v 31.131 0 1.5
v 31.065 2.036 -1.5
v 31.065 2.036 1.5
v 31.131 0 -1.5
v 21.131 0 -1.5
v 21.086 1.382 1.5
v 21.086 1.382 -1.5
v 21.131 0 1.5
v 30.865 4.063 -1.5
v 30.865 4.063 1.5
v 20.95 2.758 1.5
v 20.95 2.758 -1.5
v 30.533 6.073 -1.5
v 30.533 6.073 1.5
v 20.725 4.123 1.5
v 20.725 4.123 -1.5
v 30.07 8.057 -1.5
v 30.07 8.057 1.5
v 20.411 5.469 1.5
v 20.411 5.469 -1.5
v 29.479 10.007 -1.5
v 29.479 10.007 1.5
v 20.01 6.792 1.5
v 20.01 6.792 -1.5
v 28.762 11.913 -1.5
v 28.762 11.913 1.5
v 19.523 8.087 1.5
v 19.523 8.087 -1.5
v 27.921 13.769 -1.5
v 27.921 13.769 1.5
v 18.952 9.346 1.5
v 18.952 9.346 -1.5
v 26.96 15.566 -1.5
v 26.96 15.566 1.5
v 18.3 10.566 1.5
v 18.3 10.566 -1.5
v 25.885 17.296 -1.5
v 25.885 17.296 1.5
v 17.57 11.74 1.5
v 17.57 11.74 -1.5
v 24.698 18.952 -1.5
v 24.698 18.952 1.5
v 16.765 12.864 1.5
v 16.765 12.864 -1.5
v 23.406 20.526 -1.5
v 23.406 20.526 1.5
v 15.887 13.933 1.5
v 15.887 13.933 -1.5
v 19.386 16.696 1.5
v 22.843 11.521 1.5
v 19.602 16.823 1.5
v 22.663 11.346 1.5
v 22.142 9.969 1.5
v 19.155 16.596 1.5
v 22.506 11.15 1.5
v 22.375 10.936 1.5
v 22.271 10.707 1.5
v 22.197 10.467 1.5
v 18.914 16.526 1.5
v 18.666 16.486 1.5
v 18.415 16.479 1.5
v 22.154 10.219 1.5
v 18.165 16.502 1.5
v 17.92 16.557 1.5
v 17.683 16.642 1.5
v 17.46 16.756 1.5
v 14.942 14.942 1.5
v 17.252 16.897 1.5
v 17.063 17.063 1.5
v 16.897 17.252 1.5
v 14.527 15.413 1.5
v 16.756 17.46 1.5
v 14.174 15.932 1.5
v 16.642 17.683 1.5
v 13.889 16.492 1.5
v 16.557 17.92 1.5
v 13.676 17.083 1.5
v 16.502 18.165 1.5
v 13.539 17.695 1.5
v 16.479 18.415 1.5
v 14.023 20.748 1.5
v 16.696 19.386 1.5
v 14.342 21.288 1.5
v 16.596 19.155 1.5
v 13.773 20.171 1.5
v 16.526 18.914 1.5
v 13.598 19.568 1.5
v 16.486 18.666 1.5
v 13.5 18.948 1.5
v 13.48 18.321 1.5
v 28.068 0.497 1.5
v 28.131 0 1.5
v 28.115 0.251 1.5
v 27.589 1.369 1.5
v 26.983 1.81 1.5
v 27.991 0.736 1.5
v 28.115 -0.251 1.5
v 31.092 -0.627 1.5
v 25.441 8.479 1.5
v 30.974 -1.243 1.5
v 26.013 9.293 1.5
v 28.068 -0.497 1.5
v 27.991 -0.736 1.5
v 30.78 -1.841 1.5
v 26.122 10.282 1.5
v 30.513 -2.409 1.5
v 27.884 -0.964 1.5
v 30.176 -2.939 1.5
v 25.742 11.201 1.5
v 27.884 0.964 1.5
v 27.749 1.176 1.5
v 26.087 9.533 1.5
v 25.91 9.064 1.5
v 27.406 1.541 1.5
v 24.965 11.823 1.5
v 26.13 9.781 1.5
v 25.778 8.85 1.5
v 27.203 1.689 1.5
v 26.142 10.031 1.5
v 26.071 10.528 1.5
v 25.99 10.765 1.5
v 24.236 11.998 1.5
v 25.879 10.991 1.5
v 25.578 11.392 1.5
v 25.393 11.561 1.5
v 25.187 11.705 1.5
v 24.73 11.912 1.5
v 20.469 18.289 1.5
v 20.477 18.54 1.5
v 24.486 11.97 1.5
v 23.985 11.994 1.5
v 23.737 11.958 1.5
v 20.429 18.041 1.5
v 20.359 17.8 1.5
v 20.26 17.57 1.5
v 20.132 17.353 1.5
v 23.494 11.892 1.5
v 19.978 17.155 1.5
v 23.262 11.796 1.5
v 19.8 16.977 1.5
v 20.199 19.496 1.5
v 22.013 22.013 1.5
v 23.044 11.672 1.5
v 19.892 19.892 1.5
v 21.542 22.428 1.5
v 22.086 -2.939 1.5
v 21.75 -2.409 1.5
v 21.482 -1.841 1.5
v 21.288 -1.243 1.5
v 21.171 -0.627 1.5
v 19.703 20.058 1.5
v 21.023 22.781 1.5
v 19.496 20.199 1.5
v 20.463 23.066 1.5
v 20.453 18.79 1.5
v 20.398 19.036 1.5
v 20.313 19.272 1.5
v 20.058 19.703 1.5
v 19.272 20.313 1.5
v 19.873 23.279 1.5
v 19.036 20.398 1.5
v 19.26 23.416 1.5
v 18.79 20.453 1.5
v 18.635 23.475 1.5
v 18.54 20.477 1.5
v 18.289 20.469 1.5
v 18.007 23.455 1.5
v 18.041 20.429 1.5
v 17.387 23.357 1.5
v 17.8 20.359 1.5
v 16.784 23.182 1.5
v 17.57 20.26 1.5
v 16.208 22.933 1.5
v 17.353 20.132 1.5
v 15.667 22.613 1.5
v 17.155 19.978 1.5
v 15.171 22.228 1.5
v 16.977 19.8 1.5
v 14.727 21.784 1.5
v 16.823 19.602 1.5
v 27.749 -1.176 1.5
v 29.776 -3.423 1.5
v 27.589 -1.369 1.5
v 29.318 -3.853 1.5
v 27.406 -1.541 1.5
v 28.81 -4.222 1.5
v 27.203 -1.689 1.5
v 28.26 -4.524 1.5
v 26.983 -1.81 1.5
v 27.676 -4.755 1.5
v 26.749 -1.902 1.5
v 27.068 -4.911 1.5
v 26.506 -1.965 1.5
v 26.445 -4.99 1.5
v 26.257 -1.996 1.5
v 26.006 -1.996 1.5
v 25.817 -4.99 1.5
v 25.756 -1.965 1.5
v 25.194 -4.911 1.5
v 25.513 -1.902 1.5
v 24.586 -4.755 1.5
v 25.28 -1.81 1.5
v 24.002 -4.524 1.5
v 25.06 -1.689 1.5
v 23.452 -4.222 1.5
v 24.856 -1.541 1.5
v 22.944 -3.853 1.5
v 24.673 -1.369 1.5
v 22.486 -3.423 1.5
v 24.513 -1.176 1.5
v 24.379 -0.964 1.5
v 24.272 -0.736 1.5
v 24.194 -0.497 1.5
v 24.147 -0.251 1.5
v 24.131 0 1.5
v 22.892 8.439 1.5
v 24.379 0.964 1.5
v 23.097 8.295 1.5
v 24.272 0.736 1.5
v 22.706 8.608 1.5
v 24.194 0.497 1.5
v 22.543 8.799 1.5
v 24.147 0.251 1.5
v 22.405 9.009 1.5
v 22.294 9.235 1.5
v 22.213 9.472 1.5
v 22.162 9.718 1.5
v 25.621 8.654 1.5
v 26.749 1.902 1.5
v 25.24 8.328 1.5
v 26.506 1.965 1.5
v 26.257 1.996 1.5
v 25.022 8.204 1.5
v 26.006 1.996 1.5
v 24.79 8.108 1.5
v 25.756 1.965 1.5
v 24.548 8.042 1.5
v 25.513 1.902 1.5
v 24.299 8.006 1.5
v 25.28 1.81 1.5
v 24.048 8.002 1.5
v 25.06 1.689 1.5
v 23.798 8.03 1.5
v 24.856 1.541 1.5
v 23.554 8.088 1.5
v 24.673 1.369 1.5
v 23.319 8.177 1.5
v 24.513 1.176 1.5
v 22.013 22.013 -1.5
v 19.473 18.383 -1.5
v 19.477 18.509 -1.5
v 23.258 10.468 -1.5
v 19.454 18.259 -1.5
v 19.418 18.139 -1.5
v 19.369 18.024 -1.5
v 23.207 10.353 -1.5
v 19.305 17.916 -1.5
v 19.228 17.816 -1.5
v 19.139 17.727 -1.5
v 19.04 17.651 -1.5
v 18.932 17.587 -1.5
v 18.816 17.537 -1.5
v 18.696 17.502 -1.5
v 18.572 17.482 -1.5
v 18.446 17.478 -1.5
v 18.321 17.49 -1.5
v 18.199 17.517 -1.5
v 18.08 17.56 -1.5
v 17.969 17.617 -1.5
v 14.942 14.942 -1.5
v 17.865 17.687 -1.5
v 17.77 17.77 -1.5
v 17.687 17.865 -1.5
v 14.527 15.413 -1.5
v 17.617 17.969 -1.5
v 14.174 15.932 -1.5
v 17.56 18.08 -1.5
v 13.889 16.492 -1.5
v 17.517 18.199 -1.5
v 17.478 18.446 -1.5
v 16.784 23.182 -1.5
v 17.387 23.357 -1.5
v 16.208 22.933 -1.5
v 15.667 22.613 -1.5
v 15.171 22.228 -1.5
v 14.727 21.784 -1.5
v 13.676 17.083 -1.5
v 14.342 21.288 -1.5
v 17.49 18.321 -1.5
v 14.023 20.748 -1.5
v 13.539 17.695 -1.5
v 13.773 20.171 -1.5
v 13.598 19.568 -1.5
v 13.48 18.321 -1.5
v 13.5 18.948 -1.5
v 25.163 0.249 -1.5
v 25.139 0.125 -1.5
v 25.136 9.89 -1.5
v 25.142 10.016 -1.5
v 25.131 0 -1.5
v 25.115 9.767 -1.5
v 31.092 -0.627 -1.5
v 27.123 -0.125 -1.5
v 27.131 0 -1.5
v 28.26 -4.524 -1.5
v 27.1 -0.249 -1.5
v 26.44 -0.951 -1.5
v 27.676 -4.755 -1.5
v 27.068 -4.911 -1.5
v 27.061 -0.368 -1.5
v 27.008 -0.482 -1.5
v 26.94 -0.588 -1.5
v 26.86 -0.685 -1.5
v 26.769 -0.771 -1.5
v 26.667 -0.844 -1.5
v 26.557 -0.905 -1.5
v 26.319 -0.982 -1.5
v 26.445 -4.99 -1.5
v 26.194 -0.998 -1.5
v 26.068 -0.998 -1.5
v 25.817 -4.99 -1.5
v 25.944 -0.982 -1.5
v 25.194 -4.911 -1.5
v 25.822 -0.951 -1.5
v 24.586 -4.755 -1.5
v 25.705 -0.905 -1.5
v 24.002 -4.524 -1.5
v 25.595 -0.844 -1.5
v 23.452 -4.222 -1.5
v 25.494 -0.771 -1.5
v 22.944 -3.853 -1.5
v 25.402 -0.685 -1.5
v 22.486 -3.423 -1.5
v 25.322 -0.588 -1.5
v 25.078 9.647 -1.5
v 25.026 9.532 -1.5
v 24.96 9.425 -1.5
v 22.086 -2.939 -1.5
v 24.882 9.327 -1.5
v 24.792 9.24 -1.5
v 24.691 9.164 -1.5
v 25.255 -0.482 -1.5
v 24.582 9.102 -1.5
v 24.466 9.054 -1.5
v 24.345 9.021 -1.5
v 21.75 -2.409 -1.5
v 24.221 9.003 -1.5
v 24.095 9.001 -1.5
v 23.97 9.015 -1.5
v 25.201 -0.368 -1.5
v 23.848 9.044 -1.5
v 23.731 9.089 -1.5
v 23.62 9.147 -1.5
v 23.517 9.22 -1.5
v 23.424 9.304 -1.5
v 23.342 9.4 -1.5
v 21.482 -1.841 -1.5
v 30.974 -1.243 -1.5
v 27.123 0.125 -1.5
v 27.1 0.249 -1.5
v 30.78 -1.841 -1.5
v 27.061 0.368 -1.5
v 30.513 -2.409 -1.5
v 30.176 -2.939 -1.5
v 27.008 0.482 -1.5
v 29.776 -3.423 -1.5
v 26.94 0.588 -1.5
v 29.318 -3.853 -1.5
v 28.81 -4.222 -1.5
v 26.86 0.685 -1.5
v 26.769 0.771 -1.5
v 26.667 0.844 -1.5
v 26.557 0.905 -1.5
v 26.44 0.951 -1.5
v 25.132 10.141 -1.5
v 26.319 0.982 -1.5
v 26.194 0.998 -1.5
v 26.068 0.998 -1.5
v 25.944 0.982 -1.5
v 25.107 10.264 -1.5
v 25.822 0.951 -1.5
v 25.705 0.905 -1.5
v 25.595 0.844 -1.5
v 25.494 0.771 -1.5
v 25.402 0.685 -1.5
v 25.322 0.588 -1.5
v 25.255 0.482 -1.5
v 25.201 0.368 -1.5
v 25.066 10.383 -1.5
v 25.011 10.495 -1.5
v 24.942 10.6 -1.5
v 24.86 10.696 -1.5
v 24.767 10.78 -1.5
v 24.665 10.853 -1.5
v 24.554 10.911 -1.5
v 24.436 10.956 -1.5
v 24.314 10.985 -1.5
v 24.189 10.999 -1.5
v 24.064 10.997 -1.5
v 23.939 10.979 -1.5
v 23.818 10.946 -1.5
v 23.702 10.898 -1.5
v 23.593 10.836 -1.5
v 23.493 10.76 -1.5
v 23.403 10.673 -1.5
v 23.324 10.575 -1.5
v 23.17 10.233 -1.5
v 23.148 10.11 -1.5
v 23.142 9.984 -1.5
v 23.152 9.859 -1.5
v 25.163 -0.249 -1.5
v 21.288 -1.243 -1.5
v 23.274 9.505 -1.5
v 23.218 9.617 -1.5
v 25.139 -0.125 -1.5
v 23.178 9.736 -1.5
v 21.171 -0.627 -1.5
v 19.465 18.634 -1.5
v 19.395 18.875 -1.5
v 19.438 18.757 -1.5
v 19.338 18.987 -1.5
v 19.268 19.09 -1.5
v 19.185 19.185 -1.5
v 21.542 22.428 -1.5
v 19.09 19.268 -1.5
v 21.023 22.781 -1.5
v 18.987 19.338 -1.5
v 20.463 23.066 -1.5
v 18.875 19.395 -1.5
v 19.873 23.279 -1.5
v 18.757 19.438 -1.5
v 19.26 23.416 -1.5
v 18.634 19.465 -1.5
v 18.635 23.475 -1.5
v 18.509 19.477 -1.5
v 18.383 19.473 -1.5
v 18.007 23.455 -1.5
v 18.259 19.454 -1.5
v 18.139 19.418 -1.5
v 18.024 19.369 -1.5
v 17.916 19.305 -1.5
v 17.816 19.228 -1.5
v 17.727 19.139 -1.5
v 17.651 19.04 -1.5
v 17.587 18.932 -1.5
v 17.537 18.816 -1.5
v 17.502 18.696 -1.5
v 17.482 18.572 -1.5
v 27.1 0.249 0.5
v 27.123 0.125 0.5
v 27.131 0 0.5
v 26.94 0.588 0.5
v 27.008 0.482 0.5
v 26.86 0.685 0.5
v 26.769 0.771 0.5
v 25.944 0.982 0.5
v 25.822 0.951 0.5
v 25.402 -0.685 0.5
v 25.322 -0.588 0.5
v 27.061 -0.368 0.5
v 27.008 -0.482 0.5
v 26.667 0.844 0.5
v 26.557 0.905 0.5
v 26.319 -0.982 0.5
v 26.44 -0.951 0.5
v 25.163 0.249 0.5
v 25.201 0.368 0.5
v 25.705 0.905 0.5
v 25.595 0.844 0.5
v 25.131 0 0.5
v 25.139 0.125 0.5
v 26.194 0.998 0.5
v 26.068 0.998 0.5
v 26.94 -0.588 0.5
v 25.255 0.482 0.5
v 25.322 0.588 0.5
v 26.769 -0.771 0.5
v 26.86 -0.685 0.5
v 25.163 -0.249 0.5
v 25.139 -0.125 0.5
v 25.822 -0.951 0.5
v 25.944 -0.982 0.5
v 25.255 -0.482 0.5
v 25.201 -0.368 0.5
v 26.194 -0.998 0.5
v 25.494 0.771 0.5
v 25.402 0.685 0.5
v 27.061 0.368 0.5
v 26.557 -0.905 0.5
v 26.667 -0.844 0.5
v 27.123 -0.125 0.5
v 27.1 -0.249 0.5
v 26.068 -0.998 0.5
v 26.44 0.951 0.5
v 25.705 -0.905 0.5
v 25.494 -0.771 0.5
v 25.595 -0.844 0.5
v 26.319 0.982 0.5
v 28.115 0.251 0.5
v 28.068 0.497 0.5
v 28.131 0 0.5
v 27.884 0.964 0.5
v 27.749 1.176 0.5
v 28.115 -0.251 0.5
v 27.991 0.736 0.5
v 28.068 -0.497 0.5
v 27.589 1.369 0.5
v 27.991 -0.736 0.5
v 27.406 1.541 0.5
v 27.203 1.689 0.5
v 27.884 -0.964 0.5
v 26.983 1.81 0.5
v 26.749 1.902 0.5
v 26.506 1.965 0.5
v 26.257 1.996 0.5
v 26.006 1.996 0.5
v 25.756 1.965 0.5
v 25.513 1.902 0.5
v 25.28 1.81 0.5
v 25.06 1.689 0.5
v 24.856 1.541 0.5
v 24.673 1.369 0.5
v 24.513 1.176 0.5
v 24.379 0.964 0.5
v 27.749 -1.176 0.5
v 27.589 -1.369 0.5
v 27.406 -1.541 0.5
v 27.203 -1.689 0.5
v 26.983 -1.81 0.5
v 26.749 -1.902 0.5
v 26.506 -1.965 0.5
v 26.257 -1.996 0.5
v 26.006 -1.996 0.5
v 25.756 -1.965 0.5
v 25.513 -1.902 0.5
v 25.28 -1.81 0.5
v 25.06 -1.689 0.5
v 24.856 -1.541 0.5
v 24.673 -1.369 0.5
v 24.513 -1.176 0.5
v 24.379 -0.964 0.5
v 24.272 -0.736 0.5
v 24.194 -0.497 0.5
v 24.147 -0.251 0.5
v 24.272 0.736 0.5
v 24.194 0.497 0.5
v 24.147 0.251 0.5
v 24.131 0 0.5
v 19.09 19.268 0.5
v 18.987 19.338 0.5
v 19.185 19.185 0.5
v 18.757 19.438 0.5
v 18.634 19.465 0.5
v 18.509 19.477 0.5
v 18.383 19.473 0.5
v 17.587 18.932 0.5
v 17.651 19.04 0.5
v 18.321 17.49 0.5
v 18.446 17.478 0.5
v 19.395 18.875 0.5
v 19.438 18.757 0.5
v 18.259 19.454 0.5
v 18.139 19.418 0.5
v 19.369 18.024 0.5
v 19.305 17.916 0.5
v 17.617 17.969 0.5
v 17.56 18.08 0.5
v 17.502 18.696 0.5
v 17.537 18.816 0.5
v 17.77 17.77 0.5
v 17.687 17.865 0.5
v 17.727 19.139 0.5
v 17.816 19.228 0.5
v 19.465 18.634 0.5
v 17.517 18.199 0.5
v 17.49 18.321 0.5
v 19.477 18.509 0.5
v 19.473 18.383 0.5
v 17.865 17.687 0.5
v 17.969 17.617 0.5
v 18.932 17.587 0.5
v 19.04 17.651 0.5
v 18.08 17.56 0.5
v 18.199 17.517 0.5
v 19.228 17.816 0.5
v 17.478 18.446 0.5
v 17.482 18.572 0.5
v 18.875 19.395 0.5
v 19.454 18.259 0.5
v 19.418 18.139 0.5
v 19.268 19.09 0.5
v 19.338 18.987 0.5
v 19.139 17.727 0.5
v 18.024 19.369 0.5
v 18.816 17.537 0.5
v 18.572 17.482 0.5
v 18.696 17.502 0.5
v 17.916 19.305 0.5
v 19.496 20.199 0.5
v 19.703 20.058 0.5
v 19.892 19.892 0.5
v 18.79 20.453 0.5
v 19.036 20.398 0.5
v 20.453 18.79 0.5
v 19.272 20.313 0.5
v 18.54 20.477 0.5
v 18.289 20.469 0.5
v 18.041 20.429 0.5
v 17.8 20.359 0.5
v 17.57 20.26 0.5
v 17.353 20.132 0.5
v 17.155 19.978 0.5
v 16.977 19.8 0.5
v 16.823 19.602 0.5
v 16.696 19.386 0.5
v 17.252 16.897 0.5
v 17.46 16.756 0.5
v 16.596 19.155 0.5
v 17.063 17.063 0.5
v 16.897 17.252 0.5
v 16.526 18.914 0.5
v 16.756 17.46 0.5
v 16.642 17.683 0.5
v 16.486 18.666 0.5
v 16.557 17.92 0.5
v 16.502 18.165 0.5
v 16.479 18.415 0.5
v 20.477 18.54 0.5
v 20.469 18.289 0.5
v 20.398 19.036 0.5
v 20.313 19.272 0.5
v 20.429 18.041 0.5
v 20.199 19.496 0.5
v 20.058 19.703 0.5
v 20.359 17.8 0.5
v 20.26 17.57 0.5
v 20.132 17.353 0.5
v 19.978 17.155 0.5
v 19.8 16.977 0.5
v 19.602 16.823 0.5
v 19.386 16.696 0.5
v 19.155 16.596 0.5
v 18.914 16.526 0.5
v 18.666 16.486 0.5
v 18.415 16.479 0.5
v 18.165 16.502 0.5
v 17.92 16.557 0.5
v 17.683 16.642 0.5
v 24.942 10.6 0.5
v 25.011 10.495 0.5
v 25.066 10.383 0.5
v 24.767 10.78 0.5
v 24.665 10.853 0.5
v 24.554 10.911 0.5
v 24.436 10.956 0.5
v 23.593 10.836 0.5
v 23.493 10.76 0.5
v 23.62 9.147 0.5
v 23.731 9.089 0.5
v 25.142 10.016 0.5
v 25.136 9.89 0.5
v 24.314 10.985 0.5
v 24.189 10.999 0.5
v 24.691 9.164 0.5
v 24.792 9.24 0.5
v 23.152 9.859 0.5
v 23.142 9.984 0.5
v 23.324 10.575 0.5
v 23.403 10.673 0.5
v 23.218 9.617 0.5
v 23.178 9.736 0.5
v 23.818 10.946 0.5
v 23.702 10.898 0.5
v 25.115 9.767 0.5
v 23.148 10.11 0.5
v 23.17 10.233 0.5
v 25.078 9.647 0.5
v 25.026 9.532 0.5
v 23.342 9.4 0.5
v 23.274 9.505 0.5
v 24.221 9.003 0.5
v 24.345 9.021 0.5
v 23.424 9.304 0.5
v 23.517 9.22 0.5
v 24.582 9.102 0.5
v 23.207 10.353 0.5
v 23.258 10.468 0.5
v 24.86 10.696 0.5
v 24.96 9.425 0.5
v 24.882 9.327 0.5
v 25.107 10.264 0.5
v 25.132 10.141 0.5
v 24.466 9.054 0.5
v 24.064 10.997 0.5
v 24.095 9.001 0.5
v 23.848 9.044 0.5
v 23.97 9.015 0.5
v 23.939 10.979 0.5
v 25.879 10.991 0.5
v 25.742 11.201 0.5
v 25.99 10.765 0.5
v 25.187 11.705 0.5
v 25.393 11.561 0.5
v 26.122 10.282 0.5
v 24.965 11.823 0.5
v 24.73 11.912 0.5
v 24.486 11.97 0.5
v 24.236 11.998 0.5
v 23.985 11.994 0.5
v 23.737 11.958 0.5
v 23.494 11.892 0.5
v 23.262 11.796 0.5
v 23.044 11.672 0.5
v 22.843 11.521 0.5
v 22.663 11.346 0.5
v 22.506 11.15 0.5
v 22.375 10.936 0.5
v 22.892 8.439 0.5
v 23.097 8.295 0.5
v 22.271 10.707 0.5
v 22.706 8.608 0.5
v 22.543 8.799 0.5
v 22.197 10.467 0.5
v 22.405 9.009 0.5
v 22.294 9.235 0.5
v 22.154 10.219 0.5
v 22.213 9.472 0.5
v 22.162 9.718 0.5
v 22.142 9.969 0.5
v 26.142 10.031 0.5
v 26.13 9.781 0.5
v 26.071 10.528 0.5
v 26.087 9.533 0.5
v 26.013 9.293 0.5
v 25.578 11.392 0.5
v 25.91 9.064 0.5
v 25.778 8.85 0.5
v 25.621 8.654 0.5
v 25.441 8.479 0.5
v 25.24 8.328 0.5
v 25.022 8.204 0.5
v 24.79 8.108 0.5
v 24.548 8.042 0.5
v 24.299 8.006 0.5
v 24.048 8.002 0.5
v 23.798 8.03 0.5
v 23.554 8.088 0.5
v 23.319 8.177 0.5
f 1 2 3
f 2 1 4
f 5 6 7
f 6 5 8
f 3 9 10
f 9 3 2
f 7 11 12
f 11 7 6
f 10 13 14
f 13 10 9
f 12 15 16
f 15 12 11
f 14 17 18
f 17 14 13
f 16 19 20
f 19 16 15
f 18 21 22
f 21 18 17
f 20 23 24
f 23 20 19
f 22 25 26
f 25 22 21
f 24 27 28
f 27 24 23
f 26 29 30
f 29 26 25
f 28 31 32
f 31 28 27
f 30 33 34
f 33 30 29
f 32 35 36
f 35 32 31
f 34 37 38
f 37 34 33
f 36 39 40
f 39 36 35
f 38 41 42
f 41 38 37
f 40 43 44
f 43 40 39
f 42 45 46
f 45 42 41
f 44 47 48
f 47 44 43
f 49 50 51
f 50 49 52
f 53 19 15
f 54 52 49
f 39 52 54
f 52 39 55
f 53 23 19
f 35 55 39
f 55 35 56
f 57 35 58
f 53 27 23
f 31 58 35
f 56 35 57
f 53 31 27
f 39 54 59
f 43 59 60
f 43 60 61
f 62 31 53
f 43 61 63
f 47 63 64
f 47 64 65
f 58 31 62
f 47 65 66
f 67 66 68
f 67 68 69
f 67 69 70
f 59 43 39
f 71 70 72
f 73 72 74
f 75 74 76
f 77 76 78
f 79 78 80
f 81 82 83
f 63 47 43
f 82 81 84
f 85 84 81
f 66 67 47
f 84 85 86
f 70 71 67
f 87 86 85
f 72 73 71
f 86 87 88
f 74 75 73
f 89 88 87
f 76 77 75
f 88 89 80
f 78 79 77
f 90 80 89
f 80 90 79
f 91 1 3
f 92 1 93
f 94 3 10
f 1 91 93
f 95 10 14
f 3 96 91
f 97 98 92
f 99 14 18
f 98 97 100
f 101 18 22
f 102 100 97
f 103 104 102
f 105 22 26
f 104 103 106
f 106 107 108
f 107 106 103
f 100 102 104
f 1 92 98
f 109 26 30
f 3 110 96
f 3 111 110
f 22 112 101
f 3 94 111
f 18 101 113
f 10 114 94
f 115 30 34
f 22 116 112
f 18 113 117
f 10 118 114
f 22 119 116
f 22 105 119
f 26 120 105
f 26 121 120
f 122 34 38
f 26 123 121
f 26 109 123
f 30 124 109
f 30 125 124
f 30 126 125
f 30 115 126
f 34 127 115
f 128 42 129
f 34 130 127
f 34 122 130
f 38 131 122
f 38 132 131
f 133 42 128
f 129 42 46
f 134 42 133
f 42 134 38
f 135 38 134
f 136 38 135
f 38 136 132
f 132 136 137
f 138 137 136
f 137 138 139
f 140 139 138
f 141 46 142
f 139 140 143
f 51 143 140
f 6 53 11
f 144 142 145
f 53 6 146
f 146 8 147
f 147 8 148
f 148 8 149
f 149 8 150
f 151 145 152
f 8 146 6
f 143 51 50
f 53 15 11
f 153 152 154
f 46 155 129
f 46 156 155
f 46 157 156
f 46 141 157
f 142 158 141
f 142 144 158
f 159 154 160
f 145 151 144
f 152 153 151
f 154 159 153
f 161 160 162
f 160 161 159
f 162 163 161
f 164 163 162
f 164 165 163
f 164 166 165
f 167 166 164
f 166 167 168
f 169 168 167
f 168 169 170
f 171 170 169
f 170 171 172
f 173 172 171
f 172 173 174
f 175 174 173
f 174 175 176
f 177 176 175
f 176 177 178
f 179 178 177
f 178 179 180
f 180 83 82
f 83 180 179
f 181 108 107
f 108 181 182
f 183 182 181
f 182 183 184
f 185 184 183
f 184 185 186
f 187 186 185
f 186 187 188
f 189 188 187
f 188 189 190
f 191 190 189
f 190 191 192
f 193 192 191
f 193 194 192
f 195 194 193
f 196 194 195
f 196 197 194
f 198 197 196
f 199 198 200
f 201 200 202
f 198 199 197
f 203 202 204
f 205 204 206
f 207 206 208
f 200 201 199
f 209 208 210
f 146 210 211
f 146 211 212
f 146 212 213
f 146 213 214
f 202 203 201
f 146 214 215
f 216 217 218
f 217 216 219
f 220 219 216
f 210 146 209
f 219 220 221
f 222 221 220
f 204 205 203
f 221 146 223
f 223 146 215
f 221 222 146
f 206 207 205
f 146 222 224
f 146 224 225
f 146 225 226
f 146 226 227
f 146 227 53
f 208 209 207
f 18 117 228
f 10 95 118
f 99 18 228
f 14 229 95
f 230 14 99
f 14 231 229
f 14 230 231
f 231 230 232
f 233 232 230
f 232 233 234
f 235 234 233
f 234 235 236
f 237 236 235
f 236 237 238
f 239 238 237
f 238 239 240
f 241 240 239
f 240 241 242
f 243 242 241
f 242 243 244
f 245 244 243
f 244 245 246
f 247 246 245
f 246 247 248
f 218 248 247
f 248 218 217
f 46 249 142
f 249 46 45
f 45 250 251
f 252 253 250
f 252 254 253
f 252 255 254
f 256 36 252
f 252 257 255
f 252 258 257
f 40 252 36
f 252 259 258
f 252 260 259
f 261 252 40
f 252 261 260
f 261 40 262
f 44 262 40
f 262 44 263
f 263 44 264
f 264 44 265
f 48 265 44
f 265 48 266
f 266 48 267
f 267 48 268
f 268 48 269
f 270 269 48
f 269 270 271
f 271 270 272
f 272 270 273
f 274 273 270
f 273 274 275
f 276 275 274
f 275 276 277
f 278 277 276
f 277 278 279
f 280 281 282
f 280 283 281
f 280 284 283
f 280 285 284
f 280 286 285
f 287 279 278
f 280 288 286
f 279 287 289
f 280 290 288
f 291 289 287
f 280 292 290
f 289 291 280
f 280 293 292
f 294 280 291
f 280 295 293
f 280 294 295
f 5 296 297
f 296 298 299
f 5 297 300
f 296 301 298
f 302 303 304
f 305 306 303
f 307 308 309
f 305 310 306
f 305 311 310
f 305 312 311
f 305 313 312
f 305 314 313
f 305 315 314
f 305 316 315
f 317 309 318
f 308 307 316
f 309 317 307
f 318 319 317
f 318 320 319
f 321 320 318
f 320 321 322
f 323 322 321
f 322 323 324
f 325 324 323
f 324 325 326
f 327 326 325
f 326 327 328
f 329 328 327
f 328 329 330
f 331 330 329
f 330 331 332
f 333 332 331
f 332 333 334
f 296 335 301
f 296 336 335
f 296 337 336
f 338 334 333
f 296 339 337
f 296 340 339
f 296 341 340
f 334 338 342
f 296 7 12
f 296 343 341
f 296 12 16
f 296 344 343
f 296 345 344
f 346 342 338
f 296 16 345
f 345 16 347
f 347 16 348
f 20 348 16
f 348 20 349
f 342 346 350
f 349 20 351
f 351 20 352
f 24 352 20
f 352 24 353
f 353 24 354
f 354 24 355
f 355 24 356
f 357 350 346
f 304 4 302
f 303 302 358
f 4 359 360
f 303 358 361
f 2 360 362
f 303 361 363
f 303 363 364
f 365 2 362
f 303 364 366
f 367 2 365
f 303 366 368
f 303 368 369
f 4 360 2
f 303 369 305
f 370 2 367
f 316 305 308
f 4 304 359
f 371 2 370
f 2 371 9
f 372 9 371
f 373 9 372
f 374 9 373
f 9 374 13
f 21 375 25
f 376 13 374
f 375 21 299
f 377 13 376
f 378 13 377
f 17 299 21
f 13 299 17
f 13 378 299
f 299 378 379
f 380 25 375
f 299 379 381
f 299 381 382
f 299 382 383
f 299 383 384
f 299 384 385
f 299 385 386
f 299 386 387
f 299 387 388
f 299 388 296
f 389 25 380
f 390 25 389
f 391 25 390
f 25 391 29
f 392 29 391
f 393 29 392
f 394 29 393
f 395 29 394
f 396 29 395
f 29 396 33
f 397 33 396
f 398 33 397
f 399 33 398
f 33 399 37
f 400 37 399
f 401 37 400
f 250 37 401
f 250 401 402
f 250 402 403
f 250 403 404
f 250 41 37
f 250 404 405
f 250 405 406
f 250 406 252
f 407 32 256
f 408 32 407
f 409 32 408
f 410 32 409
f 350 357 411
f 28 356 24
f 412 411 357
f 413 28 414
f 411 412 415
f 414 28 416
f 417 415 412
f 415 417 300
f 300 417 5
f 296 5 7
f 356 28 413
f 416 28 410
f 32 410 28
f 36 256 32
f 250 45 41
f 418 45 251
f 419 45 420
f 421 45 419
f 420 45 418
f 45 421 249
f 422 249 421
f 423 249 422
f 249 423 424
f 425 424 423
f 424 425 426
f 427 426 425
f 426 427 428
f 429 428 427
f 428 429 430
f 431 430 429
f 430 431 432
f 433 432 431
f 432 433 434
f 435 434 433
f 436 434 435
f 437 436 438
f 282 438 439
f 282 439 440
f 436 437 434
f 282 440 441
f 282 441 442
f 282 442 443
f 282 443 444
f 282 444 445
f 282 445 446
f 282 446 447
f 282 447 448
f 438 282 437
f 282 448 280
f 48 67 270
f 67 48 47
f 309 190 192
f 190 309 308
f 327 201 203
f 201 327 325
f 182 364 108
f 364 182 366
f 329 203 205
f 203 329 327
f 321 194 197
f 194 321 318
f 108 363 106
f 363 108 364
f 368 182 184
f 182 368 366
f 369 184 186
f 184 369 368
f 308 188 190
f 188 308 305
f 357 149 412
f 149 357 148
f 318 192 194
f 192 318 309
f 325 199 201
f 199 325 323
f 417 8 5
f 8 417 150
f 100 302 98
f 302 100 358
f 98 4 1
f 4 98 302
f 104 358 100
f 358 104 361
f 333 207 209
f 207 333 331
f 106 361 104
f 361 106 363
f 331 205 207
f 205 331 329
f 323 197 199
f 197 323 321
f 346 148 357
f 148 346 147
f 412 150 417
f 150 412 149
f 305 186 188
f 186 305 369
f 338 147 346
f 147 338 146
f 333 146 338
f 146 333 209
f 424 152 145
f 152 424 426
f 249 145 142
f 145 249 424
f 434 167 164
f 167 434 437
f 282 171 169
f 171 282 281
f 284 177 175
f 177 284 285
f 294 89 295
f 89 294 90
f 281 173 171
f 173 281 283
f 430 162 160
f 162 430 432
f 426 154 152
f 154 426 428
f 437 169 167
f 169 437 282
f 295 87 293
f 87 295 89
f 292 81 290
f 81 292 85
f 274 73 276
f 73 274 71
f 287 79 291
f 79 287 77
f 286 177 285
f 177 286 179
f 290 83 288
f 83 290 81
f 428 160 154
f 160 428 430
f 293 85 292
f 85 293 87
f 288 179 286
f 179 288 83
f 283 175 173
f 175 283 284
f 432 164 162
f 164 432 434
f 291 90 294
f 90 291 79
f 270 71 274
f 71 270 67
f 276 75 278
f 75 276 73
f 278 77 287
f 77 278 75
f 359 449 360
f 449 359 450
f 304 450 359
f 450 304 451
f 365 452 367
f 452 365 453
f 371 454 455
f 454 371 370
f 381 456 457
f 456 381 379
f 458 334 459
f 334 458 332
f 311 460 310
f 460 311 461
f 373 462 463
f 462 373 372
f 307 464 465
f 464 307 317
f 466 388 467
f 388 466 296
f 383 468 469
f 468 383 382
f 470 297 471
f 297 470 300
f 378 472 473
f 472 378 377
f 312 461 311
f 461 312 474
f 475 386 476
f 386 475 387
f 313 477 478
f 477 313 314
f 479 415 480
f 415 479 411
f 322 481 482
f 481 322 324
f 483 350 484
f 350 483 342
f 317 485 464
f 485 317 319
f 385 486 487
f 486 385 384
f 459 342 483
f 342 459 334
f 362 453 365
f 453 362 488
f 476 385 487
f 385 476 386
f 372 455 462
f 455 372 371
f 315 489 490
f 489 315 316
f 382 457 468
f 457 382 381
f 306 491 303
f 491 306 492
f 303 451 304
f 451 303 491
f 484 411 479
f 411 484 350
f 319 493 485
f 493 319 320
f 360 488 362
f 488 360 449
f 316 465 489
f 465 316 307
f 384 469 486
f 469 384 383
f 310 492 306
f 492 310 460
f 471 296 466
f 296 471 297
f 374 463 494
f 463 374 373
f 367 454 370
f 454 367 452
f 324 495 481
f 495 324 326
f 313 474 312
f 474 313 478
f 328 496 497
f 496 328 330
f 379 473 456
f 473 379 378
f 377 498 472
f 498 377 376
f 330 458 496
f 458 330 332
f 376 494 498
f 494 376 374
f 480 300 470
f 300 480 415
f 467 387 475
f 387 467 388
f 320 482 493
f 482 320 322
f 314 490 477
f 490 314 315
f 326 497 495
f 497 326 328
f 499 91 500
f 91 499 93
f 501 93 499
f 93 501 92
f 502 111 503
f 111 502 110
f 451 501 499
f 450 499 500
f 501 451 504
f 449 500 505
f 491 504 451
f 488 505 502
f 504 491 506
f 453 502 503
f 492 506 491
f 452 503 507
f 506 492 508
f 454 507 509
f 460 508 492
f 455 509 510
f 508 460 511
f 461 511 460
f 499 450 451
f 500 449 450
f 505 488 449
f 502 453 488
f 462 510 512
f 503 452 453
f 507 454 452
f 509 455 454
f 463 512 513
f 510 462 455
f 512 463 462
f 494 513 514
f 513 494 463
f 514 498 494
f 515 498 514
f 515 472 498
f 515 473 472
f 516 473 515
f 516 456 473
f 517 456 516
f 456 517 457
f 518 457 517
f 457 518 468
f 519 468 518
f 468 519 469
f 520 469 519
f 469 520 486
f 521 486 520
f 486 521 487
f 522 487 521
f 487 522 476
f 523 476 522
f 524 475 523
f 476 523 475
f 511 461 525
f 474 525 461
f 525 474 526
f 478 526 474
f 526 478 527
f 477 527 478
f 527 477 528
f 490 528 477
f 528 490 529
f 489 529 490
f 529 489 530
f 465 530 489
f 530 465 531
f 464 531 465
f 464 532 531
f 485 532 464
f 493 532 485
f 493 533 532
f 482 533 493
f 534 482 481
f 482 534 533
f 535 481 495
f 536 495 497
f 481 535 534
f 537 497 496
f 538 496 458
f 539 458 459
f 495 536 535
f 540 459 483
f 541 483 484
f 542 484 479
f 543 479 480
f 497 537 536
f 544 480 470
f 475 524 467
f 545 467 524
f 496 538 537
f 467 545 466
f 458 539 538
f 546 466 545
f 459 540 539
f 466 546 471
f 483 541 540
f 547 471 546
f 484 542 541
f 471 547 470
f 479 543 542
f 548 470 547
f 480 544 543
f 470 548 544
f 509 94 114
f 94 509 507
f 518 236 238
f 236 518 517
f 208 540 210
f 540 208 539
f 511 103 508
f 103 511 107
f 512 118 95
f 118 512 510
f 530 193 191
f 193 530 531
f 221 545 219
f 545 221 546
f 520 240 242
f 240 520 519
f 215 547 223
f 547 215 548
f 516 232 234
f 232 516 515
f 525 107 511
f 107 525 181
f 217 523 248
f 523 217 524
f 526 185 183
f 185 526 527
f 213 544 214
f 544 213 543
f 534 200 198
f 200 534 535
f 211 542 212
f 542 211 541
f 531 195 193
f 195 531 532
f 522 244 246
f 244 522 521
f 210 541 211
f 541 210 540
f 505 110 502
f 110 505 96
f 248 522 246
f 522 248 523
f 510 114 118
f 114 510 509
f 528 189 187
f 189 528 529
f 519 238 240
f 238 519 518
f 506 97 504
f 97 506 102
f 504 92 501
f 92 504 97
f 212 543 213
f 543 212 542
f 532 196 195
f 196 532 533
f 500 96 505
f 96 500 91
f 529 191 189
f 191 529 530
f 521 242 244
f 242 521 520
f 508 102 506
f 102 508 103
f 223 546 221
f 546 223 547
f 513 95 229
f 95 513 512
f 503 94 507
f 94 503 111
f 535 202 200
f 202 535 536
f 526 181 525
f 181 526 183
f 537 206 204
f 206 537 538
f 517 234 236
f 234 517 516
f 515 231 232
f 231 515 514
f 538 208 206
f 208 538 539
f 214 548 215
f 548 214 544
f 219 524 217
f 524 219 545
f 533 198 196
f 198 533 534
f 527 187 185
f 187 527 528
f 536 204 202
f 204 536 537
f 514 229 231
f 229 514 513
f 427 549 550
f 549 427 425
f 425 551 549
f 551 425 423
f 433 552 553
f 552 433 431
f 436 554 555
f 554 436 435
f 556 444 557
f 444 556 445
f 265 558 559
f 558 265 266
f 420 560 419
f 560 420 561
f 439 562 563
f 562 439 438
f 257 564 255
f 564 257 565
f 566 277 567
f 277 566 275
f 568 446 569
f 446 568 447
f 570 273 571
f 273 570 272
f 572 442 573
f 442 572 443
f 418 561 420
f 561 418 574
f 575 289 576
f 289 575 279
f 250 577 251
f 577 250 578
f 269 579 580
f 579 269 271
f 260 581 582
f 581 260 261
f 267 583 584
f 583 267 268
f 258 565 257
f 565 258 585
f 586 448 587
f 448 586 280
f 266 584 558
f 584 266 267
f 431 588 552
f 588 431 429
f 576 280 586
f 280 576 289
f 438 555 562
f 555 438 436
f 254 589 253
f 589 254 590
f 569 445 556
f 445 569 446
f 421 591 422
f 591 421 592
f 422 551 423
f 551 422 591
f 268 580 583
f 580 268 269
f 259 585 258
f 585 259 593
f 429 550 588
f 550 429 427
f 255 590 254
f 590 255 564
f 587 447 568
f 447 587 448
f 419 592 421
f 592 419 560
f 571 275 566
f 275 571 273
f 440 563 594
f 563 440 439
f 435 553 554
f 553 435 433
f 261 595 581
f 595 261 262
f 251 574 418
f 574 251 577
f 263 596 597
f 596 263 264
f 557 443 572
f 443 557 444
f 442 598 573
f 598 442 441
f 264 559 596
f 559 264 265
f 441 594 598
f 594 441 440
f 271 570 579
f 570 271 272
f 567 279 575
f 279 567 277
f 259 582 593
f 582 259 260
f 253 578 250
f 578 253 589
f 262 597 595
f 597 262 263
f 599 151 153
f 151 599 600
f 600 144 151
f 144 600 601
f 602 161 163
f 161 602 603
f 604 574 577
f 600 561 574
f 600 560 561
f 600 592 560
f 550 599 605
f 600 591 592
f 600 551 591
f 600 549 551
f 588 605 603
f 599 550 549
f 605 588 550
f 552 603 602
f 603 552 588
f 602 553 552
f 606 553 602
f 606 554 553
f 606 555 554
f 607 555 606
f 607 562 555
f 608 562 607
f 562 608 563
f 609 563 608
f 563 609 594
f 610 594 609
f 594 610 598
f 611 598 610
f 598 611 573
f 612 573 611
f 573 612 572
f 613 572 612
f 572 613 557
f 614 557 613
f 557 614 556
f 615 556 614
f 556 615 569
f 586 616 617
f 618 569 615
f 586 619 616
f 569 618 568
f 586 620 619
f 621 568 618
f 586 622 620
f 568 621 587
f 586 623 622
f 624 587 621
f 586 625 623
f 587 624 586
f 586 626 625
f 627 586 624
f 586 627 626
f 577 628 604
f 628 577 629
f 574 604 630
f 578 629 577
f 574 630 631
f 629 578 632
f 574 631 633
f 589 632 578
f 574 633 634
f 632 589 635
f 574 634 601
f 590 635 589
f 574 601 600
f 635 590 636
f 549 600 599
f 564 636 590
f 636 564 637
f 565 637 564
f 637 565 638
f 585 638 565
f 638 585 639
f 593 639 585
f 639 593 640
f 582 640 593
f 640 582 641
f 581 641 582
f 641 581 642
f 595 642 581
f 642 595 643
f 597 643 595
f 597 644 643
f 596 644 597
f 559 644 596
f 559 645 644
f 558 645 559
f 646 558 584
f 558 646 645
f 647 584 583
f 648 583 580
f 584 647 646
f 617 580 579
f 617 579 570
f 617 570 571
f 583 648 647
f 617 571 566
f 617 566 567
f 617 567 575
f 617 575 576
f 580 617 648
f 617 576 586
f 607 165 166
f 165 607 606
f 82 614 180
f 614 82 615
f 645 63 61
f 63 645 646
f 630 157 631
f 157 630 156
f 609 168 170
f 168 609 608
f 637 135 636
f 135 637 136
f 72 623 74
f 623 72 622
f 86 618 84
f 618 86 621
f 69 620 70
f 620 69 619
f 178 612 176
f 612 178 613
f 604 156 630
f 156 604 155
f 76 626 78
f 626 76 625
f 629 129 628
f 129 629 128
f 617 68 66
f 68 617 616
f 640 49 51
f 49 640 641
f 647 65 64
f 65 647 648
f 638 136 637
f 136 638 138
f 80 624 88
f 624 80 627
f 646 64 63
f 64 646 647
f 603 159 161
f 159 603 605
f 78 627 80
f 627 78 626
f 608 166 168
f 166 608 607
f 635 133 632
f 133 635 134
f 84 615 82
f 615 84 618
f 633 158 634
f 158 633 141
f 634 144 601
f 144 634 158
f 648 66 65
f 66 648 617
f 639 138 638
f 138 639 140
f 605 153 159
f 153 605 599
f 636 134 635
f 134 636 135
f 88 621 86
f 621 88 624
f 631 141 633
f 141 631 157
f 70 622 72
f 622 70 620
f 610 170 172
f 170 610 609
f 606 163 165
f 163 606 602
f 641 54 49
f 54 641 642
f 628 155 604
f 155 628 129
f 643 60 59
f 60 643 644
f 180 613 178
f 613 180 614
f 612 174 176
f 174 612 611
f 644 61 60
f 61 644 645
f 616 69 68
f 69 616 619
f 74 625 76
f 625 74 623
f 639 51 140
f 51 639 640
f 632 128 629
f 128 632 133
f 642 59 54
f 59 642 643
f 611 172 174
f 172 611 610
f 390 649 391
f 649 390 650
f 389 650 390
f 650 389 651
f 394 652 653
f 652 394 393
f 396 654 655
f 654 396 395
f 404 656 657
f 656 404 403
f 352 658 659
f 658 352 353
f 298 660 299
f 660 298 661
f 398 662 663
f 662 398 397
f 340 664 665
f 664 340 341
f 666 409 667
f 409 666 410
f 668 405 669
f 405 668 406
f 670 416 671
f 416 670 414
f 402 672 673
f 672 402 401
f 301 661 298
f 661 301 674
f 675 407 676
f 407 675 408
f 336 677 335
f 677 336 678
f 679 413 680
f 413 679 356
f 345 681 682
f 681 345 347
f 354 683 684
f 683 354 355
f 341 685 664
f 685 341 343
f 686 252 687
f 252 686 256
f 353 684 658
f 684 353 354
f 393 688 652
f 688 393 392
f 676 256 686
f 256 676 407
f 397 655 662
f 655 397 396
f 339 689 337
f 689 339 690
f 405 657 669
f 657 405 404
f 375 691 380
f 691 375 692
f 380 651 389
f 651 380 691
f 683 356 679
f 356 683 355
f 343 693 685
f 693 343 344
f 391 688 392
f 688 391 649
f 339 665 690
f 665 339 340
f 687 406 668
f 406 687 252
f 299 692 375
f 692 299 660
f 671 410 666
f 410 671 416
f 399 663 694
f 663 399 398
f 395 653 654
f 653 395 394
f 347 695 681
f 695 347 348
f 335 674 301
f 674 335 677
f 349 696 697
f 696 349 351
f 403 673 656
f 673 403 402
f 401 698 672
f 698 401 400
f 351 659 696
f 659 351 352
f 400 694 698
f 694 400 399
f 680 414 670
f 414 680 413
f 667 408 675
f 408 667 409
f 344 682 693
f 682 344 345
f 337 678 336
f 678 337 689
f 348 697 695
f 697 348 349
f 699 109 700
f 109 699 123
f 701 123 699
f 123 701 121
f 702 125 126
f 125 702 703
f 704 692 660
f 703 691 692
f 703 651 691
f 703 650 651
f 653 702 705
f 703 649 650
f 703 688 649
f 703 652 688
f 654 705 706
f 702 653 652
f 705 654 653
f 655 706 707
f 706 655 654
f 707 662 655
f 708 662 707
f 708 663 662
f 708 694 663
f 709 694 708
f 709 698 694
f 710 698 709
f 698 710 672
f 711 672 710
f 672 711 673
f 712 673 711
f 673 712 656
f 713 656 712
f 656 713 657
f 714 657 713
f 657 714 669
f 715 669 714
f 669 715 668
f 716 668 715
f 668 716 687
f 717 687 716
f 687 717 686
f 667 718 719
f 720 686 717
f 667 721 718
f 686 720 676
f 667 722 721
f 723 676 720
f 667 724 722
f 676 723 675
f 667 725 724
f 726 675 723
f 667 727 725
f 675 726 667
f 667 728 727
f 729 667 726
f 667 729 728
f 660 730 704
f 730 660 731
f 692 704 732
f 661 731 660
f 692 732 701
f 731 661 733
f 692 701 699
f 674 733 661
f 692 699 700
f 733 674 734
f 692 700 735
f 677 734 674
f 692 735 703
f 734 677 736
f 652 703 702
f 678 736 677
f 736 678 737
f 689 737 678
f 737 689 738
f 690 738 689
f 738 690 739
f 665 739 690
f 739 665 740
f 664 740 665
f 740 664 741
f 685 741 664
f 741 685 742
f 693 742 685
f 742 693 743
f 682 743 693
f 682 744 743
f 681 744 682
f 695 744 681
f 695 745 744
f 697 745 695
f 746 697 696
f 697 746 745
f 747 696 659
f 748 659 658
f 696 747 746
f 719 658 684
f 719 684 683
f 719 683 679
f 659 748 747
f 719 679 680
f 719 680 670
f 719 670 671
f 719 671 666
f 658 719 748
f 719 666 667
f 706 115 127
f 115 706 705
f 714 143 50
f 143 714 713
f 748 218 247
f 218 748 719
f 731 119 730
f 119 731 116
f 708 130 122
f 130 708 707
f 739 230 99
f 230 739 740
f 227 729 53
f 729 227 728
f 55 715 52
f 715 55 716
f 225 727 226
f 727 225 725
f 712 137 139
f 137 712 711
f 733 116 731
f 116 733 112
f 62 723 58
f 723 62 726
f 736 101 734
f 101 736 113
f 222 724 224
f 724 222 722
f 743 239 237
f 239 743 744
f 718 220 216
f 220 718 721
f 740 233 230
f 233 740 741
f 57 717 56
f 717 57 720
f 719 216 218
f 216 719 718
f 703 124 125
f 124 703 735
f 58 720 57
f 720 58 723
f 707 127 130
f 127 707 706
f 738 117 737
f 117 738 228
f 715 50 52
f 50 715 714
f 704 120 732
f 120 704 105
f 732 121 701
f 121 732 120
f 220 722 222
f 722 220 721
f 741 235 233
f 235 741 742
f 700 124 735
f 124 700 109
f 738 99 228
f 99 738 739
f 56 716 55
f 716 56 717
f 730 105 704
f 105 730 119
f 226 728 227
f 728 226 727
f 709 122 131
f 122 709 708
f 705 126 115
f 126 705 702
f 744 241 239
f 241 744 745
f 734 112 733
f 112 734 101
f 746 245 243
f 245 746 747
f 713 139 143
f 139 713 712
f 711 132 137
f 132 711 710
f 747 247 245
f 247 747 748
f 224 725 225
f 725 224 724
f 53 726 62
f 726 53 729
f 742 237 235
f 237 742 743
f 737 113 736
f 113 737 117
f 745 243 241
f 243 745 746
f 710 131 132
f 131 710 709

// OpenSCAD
$fn = 50;

// How wide should tap be?
width = 10;
// How thick should tap be?
thick = 3;
// How much arc should the tap have?
arc = 45; // [30:180]
// How long should the tap be?
tap_length = 30; // [20:100]
// Nail diameter
nail_shaft_diam = 2;
// Nail head diameter
nail_head_diam = 4;
// Nail head thickness
nail_head_thick = 1;
// Want to show nail holes?
use_nails = "Yes"; // [Yes,No]

// Calc tap interior radius of curvature?
radius = - ((sin(arc/2)+1)*width-tap_length)/(2*sin(arc/2));

module tap_flat() {

// basic arc
module basic_arc()
{rotate_extrude(angle=arc, convexity=10, $fn = 100)
translate([width/2+radius,0,0])
square(size=[width, thick], center=true);}

// arc subtraction shape
module arc_subtract_shape()
{translate([0,-(width+radius),0])
cube([2*(width+radius),2*(width+radius),thick*2], center=true);
rotate([0,0,arc])
translate([0,(width+radius),0])
cube([2*(width+radius),2*(width+radius),thick*2], center=true);}

// arc
difference() {
basic_arc();
arc_subtract_shape();
}

//Round ends
{translate([radius+width/2,0,0])
cylinder(r=width/2,h=thick, center=true);}
{rotate([0,0,arc])
translate([radius+width/2,0,0])
cylinder(r=width/2,h=thick, center=true);}
}

//Nail Hole
module nail_void() {
cylinder(r=nail_shaft_diam/2,h=thick, center=true);
translate([0,0,thick/2-nail_head_thick])
cylinder(r=nail_head_diam/2,h=nail_head_thick);
}

//Nail Holes
module nail_voids() {
{rotate([0,0,arc])
translate([radius+width/2,0,0])
nail_void();}
{rotate([0,0,arc/2])
translate([radius+width/2,0,0])
nail_void();}
{translate([radius+width/2,0,0])
nail_void();}
}

if (use_nails=="Yes") {
    difference() {
    tap_flat();
    nail_voids();
    }
}
else
{
    tap_flat();
}
